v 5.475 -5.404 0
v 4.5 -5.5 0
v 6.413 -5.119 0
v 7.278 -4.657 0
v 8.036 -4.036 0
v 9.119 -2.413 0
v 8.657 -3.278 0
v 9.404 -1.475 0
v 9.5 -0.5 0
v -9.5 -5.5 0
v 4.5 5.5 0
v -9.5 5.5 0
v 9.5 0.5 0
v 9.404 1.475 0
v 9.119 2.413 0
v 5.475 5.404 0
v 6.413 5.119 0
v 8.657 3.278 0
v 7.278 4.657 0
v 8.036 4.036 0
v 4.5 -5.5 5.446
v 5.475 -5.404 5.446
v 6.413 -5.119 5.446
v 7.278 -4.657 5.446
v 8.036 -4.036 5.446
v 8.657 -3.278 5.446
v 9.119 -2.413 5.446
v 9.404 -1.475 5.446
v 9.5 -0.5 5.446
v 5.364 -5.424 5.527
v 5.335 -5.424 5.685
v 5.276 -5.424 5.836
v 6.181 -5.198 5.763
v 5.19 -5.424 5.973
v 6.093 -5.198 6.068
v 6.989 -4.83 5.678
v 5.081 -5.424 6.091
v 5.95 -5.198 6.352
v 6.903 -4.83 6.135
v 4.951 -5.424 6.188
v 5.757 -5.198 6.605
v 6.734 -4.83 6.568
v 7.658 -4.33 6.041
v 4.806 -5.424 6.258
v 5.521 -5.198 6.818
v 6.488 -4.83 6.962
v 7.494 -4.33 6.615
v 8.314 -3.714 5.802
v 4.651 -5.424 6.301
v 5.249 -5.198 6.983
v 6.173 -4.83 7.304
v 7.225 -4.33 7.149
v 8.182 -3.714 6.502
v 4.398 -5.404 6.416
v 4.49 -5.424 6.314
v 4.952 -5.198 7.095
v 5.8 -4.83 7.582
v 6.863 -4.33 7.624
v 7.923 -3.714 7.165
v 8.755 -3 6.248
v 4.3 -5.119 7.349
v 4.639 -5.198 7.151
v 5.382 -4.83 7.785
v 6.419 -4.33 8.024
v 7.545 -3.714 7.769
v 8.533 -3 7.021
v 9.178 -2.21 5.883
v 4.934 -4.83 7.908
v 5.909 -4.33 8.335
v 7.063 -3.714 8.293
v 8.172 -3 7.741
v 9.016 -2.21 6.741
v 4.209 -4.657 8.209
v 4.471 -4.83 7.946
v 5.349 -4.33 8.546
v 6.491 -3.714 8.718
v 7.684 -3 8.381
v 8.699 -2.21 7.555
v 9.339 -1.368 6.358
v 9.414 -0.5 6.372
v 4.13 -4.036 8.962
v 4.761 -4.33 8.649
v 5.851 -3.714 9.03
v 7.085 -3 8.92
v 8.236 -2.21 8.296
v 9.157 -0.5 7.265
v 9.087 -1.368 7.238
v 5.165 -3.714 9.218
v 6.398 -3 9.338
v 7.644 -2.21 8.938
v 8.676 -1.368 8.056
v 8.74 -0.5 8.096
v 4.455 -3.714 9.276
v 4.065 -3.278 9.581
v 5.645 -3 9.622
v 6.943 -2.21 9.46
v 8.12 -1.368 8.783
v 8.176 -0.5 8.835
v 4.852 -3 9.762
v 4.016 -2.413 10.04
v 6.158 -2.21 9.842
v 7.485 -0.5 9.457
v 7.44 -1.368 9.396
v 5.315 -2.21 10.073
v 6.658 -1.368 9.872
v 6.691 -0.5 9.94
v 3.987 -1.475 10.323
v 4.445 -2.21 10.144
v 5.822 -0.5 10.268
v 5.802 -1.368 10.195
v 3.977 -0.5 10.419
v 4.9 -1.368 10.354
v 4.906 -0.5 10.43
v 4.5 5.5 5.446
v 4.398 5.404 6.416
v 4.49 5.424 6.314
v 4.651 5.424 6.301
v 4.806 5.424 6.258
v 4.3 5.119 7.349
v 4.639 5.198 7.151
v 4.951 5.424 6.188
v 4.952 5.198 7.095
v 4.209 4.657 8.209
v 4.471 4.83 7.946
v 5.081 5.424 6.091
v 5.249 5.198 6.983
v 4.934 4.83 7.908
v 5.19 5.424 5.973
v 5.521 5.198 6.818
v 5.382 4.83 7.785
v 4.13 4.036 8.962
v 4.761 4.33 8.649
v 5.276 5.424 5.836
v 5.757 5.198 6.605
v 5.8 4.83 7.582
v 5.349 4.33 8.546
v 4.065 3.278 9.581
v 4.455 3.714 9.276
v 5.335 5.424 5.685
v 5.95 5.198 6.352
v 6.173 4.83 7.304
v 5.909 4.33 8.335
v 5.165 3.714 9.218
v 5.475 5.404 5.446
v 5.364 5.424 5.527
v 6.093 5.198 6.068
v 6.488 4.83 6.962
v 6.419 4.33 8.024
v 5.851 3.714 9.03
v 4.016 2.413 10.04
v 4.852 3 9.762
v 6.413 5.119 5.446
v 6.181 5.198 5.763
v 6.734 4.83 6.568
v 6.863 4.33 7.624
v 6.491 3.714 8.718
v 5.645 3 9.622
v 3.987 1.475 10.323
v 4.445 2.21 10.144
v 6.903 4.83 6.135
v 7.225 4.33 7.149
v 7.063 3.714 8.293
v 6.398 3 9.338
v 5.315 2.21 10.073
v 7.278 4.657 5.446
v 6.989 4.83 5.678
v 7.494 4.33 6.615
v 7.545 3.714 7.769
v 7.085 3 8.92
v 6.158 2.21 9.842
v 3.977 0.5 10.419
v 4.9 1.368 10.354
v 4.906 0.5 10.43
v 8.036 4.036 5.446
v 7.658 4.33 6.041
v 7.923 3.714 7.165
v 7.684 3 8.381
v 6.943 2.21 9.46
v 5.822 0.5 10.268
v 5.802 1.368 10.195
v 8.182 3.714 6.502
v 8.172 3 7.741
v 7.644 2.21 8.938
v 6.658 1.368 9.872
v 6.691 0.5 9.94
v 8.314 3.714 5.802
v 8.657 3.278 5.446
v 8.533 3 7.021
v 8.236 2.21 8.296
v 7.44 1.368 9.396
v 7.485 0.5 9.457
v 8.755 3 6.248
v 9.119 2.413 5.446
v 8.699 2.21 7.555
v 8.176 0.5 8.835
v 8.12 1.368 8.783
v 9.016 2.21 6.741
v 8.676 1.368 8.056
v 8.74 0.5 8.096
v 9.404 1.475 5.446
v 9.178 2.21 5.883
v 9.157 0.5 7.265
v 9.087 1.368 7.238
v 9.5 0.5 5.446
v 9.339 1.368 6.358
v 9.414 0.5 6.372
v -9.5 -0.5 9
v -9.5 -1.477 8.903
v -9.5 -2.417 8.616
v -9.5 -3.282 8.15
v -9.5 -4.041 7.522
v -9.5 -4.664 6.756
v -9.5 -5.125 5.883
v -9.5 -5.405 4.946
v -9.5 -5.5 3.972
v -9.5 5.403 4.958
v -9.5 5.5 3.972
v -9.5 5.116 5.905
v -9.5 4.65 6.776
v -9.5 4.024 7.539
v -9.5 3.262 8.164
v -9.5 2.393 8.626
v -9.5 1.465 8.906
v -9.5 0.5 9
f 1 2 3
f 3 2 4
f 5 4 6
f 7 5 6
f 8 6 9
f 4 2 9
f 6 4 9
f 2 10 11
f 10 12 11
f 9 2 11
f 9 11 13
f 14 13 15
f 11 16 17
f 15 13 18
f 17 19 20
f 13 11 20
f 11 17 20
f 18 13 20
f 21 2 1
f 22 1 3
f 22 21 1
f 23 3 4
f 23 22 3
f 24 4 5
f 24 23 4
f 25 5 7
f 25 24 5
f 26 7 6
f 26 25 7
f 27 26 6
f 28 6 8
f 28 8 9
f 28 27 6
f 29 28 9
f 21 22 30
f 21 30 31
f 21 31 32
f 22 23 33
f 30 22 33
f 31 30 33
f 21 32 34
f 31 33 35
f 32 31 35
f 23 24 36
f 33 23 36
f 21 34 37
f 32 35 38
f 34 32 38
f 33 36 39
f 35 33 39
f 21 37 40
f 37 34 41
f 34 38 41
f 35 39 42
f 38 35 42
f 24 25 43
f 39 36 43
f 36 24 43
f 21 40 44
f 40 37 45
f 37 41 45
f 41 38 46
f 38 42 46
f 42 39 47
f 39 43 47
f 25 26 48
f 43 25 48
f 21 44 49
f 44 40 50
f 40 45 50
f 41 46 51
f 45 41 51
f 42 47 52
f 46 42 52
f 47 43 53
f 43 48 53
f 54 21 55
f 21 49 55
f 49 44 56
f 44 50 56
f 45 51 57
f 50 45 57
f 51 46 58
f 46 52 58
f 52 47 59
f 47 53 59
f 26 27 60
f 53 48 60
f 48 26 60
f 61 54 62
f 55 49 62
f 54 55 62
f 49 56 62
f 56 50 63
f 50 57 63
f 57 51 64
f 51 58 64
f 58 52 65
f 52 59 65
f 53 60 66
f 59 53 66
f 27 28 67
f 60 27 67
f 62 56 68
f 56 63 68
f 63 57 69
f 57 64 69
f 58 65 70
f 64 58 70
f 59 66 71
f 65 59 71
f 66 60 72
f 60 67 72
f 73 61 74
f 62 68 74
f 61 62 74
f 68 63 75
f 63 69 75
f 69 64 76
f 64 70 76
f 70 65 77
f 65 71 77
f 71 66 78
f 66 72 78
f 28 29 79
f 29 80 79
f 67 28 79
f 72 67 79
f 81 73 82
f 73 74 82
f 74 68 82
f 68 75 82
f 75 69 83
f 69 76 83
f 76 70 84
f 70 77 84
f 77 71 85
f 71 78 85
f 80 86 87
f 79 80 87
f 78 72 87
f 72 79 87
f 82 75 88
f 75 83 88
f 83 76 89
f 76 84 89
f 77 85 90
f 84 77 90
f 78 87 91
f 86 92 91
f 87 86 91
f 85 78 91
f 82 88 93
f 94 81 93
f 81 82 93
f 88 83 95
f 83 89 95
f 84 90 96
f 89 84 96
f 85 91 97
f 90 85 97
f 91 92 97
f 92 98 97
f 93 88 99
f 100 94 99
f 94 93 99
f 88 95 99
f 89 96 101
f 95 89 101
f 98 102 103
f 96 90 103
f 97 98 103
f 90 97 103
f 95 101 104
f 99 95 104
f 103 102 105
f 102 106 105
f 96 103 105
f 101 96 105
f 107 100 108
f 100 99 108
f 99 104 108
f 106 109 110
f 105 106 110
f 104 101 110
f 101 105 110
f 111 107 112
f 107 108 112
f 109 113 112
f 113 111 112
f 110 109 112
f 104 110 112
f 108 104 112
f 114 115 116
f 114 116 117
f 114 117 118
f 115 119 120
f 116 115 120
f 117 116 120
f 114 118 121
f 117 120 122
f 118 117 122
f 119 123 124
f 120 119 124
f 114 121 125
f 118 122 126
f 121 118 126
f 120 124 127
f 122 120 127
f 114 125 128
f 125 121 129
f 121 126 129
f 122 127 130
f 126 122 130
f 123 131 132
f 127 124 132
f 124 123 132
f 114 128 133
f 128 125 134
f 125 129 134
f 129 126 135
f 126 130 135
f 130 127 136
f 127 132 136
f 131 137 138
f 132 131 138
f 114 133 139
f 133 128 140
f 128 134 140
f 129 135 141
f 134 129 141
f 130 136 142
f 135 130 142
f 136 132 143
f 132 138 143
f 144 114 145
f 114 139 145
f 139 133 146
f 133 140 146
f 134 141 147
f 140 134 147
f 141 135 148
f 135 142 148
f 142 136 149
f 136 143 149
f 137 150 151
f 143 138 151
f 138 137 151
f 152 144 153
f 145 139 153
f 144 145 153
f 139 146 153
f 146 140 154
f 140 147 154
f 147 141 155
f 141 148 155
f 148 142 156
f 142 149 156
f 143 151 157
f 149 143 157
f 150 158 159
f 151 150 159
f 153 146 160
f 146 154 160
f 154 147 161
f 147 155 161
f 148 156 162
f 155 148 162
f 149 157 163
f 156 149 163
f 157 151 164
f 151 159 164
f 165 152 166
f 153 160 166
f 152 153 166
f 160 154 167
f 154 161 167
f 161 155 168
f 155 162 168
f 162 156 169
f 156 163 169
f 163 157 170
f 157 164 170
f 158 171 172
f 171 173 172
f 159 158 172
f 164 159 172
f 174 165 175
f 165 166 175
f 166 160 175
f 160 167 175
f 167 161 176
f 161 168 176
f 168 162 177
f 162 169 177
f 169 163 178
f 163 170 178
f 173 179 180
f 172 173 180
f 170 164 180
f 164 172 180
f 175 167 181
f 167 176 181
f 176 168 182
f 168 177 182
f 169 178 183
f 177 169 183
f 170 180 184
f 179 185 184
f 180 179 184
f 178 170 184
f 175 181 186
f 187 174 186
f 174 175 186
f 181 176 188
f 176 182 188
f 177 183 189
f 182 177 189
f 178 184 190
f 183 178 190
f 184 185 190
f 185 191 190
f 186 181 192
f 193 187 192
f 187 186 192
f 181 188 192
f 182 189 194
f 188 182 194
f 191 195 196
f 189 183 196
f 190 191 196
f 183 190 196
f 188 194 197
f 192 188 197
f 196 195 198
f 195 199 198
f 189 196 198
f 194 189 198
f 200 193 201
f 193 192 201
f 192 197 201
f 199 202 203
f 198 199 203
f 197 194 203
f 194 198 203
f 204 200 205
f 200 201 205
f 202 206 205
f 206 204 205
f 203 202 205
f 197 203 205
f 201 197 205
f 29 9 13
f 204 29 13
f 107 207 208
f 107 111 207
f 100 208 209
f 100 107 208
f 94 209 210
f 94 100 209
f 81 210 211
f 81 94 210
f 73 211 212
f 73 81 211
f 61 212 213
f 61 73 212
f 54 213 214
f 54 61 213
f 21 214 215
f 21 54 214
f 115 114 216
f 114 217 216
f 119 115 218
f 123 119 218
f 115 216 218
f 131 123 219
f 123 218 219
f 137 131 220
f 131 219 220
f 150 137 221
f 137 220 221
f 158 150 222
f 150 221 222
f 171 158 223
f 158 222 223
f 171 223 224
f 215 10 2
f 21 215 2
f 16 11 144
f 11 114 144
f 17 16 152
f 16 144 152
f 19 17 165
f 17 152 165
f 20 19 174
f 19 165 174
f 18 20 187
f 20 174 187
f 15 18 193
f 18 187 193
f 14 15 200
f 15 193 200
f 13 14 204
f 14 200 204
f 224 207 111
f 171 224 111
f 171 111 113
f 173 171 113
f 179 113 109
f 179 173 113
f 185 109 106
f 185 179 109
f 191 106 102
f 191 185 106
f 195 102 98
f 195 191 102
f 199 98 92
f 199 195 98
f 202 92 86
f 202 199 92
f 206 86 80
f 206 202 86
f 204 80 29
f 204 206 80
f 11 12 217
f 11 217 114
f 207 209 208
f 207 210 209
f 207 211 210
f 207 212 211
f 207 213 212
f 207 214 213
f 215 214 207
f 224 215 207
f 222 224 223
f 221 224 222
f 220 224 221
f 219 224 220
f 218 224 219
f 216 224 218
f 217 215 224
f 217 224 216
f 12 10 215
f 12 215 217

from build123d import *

# Parameters (mm, degrees)
F0_W     = 19
F0_H     = 11
F1_DEPTH = 11
F3_DEPTH = 25
F4_R     = 5


with BuildPart() as f1:
    # F0 (on Top) → F1 (new body)
    with BuildSketch(Plane.XY):
        Rectangle(F0_W, F0_H)
    extrude(amount=F1_DEPTH)

    # F2 (on face) → F3 (cut)
    with BuildSketch(Plane.XZ.offset(5.5)):
        Polygon((-9.5, 11), (-9.5, 9), (9.5, 11), align=None)
    extrude(amount=-F3_DEPTH, mode=Mode.SUBTRACT)

    # F4
    f4_edges = [f1.edges().sort_by_distance(p)[0] for p in [
        (0, -5.5, 10),
        (9.5, 0, 11),
        (0, 5.5, 10),
        (9.5, -5.5, 5.5),
        (9.5, 5.5, 5.5),
    ]]
    fillet(f4_edges, radius=F4_R)


solid = f1.part
